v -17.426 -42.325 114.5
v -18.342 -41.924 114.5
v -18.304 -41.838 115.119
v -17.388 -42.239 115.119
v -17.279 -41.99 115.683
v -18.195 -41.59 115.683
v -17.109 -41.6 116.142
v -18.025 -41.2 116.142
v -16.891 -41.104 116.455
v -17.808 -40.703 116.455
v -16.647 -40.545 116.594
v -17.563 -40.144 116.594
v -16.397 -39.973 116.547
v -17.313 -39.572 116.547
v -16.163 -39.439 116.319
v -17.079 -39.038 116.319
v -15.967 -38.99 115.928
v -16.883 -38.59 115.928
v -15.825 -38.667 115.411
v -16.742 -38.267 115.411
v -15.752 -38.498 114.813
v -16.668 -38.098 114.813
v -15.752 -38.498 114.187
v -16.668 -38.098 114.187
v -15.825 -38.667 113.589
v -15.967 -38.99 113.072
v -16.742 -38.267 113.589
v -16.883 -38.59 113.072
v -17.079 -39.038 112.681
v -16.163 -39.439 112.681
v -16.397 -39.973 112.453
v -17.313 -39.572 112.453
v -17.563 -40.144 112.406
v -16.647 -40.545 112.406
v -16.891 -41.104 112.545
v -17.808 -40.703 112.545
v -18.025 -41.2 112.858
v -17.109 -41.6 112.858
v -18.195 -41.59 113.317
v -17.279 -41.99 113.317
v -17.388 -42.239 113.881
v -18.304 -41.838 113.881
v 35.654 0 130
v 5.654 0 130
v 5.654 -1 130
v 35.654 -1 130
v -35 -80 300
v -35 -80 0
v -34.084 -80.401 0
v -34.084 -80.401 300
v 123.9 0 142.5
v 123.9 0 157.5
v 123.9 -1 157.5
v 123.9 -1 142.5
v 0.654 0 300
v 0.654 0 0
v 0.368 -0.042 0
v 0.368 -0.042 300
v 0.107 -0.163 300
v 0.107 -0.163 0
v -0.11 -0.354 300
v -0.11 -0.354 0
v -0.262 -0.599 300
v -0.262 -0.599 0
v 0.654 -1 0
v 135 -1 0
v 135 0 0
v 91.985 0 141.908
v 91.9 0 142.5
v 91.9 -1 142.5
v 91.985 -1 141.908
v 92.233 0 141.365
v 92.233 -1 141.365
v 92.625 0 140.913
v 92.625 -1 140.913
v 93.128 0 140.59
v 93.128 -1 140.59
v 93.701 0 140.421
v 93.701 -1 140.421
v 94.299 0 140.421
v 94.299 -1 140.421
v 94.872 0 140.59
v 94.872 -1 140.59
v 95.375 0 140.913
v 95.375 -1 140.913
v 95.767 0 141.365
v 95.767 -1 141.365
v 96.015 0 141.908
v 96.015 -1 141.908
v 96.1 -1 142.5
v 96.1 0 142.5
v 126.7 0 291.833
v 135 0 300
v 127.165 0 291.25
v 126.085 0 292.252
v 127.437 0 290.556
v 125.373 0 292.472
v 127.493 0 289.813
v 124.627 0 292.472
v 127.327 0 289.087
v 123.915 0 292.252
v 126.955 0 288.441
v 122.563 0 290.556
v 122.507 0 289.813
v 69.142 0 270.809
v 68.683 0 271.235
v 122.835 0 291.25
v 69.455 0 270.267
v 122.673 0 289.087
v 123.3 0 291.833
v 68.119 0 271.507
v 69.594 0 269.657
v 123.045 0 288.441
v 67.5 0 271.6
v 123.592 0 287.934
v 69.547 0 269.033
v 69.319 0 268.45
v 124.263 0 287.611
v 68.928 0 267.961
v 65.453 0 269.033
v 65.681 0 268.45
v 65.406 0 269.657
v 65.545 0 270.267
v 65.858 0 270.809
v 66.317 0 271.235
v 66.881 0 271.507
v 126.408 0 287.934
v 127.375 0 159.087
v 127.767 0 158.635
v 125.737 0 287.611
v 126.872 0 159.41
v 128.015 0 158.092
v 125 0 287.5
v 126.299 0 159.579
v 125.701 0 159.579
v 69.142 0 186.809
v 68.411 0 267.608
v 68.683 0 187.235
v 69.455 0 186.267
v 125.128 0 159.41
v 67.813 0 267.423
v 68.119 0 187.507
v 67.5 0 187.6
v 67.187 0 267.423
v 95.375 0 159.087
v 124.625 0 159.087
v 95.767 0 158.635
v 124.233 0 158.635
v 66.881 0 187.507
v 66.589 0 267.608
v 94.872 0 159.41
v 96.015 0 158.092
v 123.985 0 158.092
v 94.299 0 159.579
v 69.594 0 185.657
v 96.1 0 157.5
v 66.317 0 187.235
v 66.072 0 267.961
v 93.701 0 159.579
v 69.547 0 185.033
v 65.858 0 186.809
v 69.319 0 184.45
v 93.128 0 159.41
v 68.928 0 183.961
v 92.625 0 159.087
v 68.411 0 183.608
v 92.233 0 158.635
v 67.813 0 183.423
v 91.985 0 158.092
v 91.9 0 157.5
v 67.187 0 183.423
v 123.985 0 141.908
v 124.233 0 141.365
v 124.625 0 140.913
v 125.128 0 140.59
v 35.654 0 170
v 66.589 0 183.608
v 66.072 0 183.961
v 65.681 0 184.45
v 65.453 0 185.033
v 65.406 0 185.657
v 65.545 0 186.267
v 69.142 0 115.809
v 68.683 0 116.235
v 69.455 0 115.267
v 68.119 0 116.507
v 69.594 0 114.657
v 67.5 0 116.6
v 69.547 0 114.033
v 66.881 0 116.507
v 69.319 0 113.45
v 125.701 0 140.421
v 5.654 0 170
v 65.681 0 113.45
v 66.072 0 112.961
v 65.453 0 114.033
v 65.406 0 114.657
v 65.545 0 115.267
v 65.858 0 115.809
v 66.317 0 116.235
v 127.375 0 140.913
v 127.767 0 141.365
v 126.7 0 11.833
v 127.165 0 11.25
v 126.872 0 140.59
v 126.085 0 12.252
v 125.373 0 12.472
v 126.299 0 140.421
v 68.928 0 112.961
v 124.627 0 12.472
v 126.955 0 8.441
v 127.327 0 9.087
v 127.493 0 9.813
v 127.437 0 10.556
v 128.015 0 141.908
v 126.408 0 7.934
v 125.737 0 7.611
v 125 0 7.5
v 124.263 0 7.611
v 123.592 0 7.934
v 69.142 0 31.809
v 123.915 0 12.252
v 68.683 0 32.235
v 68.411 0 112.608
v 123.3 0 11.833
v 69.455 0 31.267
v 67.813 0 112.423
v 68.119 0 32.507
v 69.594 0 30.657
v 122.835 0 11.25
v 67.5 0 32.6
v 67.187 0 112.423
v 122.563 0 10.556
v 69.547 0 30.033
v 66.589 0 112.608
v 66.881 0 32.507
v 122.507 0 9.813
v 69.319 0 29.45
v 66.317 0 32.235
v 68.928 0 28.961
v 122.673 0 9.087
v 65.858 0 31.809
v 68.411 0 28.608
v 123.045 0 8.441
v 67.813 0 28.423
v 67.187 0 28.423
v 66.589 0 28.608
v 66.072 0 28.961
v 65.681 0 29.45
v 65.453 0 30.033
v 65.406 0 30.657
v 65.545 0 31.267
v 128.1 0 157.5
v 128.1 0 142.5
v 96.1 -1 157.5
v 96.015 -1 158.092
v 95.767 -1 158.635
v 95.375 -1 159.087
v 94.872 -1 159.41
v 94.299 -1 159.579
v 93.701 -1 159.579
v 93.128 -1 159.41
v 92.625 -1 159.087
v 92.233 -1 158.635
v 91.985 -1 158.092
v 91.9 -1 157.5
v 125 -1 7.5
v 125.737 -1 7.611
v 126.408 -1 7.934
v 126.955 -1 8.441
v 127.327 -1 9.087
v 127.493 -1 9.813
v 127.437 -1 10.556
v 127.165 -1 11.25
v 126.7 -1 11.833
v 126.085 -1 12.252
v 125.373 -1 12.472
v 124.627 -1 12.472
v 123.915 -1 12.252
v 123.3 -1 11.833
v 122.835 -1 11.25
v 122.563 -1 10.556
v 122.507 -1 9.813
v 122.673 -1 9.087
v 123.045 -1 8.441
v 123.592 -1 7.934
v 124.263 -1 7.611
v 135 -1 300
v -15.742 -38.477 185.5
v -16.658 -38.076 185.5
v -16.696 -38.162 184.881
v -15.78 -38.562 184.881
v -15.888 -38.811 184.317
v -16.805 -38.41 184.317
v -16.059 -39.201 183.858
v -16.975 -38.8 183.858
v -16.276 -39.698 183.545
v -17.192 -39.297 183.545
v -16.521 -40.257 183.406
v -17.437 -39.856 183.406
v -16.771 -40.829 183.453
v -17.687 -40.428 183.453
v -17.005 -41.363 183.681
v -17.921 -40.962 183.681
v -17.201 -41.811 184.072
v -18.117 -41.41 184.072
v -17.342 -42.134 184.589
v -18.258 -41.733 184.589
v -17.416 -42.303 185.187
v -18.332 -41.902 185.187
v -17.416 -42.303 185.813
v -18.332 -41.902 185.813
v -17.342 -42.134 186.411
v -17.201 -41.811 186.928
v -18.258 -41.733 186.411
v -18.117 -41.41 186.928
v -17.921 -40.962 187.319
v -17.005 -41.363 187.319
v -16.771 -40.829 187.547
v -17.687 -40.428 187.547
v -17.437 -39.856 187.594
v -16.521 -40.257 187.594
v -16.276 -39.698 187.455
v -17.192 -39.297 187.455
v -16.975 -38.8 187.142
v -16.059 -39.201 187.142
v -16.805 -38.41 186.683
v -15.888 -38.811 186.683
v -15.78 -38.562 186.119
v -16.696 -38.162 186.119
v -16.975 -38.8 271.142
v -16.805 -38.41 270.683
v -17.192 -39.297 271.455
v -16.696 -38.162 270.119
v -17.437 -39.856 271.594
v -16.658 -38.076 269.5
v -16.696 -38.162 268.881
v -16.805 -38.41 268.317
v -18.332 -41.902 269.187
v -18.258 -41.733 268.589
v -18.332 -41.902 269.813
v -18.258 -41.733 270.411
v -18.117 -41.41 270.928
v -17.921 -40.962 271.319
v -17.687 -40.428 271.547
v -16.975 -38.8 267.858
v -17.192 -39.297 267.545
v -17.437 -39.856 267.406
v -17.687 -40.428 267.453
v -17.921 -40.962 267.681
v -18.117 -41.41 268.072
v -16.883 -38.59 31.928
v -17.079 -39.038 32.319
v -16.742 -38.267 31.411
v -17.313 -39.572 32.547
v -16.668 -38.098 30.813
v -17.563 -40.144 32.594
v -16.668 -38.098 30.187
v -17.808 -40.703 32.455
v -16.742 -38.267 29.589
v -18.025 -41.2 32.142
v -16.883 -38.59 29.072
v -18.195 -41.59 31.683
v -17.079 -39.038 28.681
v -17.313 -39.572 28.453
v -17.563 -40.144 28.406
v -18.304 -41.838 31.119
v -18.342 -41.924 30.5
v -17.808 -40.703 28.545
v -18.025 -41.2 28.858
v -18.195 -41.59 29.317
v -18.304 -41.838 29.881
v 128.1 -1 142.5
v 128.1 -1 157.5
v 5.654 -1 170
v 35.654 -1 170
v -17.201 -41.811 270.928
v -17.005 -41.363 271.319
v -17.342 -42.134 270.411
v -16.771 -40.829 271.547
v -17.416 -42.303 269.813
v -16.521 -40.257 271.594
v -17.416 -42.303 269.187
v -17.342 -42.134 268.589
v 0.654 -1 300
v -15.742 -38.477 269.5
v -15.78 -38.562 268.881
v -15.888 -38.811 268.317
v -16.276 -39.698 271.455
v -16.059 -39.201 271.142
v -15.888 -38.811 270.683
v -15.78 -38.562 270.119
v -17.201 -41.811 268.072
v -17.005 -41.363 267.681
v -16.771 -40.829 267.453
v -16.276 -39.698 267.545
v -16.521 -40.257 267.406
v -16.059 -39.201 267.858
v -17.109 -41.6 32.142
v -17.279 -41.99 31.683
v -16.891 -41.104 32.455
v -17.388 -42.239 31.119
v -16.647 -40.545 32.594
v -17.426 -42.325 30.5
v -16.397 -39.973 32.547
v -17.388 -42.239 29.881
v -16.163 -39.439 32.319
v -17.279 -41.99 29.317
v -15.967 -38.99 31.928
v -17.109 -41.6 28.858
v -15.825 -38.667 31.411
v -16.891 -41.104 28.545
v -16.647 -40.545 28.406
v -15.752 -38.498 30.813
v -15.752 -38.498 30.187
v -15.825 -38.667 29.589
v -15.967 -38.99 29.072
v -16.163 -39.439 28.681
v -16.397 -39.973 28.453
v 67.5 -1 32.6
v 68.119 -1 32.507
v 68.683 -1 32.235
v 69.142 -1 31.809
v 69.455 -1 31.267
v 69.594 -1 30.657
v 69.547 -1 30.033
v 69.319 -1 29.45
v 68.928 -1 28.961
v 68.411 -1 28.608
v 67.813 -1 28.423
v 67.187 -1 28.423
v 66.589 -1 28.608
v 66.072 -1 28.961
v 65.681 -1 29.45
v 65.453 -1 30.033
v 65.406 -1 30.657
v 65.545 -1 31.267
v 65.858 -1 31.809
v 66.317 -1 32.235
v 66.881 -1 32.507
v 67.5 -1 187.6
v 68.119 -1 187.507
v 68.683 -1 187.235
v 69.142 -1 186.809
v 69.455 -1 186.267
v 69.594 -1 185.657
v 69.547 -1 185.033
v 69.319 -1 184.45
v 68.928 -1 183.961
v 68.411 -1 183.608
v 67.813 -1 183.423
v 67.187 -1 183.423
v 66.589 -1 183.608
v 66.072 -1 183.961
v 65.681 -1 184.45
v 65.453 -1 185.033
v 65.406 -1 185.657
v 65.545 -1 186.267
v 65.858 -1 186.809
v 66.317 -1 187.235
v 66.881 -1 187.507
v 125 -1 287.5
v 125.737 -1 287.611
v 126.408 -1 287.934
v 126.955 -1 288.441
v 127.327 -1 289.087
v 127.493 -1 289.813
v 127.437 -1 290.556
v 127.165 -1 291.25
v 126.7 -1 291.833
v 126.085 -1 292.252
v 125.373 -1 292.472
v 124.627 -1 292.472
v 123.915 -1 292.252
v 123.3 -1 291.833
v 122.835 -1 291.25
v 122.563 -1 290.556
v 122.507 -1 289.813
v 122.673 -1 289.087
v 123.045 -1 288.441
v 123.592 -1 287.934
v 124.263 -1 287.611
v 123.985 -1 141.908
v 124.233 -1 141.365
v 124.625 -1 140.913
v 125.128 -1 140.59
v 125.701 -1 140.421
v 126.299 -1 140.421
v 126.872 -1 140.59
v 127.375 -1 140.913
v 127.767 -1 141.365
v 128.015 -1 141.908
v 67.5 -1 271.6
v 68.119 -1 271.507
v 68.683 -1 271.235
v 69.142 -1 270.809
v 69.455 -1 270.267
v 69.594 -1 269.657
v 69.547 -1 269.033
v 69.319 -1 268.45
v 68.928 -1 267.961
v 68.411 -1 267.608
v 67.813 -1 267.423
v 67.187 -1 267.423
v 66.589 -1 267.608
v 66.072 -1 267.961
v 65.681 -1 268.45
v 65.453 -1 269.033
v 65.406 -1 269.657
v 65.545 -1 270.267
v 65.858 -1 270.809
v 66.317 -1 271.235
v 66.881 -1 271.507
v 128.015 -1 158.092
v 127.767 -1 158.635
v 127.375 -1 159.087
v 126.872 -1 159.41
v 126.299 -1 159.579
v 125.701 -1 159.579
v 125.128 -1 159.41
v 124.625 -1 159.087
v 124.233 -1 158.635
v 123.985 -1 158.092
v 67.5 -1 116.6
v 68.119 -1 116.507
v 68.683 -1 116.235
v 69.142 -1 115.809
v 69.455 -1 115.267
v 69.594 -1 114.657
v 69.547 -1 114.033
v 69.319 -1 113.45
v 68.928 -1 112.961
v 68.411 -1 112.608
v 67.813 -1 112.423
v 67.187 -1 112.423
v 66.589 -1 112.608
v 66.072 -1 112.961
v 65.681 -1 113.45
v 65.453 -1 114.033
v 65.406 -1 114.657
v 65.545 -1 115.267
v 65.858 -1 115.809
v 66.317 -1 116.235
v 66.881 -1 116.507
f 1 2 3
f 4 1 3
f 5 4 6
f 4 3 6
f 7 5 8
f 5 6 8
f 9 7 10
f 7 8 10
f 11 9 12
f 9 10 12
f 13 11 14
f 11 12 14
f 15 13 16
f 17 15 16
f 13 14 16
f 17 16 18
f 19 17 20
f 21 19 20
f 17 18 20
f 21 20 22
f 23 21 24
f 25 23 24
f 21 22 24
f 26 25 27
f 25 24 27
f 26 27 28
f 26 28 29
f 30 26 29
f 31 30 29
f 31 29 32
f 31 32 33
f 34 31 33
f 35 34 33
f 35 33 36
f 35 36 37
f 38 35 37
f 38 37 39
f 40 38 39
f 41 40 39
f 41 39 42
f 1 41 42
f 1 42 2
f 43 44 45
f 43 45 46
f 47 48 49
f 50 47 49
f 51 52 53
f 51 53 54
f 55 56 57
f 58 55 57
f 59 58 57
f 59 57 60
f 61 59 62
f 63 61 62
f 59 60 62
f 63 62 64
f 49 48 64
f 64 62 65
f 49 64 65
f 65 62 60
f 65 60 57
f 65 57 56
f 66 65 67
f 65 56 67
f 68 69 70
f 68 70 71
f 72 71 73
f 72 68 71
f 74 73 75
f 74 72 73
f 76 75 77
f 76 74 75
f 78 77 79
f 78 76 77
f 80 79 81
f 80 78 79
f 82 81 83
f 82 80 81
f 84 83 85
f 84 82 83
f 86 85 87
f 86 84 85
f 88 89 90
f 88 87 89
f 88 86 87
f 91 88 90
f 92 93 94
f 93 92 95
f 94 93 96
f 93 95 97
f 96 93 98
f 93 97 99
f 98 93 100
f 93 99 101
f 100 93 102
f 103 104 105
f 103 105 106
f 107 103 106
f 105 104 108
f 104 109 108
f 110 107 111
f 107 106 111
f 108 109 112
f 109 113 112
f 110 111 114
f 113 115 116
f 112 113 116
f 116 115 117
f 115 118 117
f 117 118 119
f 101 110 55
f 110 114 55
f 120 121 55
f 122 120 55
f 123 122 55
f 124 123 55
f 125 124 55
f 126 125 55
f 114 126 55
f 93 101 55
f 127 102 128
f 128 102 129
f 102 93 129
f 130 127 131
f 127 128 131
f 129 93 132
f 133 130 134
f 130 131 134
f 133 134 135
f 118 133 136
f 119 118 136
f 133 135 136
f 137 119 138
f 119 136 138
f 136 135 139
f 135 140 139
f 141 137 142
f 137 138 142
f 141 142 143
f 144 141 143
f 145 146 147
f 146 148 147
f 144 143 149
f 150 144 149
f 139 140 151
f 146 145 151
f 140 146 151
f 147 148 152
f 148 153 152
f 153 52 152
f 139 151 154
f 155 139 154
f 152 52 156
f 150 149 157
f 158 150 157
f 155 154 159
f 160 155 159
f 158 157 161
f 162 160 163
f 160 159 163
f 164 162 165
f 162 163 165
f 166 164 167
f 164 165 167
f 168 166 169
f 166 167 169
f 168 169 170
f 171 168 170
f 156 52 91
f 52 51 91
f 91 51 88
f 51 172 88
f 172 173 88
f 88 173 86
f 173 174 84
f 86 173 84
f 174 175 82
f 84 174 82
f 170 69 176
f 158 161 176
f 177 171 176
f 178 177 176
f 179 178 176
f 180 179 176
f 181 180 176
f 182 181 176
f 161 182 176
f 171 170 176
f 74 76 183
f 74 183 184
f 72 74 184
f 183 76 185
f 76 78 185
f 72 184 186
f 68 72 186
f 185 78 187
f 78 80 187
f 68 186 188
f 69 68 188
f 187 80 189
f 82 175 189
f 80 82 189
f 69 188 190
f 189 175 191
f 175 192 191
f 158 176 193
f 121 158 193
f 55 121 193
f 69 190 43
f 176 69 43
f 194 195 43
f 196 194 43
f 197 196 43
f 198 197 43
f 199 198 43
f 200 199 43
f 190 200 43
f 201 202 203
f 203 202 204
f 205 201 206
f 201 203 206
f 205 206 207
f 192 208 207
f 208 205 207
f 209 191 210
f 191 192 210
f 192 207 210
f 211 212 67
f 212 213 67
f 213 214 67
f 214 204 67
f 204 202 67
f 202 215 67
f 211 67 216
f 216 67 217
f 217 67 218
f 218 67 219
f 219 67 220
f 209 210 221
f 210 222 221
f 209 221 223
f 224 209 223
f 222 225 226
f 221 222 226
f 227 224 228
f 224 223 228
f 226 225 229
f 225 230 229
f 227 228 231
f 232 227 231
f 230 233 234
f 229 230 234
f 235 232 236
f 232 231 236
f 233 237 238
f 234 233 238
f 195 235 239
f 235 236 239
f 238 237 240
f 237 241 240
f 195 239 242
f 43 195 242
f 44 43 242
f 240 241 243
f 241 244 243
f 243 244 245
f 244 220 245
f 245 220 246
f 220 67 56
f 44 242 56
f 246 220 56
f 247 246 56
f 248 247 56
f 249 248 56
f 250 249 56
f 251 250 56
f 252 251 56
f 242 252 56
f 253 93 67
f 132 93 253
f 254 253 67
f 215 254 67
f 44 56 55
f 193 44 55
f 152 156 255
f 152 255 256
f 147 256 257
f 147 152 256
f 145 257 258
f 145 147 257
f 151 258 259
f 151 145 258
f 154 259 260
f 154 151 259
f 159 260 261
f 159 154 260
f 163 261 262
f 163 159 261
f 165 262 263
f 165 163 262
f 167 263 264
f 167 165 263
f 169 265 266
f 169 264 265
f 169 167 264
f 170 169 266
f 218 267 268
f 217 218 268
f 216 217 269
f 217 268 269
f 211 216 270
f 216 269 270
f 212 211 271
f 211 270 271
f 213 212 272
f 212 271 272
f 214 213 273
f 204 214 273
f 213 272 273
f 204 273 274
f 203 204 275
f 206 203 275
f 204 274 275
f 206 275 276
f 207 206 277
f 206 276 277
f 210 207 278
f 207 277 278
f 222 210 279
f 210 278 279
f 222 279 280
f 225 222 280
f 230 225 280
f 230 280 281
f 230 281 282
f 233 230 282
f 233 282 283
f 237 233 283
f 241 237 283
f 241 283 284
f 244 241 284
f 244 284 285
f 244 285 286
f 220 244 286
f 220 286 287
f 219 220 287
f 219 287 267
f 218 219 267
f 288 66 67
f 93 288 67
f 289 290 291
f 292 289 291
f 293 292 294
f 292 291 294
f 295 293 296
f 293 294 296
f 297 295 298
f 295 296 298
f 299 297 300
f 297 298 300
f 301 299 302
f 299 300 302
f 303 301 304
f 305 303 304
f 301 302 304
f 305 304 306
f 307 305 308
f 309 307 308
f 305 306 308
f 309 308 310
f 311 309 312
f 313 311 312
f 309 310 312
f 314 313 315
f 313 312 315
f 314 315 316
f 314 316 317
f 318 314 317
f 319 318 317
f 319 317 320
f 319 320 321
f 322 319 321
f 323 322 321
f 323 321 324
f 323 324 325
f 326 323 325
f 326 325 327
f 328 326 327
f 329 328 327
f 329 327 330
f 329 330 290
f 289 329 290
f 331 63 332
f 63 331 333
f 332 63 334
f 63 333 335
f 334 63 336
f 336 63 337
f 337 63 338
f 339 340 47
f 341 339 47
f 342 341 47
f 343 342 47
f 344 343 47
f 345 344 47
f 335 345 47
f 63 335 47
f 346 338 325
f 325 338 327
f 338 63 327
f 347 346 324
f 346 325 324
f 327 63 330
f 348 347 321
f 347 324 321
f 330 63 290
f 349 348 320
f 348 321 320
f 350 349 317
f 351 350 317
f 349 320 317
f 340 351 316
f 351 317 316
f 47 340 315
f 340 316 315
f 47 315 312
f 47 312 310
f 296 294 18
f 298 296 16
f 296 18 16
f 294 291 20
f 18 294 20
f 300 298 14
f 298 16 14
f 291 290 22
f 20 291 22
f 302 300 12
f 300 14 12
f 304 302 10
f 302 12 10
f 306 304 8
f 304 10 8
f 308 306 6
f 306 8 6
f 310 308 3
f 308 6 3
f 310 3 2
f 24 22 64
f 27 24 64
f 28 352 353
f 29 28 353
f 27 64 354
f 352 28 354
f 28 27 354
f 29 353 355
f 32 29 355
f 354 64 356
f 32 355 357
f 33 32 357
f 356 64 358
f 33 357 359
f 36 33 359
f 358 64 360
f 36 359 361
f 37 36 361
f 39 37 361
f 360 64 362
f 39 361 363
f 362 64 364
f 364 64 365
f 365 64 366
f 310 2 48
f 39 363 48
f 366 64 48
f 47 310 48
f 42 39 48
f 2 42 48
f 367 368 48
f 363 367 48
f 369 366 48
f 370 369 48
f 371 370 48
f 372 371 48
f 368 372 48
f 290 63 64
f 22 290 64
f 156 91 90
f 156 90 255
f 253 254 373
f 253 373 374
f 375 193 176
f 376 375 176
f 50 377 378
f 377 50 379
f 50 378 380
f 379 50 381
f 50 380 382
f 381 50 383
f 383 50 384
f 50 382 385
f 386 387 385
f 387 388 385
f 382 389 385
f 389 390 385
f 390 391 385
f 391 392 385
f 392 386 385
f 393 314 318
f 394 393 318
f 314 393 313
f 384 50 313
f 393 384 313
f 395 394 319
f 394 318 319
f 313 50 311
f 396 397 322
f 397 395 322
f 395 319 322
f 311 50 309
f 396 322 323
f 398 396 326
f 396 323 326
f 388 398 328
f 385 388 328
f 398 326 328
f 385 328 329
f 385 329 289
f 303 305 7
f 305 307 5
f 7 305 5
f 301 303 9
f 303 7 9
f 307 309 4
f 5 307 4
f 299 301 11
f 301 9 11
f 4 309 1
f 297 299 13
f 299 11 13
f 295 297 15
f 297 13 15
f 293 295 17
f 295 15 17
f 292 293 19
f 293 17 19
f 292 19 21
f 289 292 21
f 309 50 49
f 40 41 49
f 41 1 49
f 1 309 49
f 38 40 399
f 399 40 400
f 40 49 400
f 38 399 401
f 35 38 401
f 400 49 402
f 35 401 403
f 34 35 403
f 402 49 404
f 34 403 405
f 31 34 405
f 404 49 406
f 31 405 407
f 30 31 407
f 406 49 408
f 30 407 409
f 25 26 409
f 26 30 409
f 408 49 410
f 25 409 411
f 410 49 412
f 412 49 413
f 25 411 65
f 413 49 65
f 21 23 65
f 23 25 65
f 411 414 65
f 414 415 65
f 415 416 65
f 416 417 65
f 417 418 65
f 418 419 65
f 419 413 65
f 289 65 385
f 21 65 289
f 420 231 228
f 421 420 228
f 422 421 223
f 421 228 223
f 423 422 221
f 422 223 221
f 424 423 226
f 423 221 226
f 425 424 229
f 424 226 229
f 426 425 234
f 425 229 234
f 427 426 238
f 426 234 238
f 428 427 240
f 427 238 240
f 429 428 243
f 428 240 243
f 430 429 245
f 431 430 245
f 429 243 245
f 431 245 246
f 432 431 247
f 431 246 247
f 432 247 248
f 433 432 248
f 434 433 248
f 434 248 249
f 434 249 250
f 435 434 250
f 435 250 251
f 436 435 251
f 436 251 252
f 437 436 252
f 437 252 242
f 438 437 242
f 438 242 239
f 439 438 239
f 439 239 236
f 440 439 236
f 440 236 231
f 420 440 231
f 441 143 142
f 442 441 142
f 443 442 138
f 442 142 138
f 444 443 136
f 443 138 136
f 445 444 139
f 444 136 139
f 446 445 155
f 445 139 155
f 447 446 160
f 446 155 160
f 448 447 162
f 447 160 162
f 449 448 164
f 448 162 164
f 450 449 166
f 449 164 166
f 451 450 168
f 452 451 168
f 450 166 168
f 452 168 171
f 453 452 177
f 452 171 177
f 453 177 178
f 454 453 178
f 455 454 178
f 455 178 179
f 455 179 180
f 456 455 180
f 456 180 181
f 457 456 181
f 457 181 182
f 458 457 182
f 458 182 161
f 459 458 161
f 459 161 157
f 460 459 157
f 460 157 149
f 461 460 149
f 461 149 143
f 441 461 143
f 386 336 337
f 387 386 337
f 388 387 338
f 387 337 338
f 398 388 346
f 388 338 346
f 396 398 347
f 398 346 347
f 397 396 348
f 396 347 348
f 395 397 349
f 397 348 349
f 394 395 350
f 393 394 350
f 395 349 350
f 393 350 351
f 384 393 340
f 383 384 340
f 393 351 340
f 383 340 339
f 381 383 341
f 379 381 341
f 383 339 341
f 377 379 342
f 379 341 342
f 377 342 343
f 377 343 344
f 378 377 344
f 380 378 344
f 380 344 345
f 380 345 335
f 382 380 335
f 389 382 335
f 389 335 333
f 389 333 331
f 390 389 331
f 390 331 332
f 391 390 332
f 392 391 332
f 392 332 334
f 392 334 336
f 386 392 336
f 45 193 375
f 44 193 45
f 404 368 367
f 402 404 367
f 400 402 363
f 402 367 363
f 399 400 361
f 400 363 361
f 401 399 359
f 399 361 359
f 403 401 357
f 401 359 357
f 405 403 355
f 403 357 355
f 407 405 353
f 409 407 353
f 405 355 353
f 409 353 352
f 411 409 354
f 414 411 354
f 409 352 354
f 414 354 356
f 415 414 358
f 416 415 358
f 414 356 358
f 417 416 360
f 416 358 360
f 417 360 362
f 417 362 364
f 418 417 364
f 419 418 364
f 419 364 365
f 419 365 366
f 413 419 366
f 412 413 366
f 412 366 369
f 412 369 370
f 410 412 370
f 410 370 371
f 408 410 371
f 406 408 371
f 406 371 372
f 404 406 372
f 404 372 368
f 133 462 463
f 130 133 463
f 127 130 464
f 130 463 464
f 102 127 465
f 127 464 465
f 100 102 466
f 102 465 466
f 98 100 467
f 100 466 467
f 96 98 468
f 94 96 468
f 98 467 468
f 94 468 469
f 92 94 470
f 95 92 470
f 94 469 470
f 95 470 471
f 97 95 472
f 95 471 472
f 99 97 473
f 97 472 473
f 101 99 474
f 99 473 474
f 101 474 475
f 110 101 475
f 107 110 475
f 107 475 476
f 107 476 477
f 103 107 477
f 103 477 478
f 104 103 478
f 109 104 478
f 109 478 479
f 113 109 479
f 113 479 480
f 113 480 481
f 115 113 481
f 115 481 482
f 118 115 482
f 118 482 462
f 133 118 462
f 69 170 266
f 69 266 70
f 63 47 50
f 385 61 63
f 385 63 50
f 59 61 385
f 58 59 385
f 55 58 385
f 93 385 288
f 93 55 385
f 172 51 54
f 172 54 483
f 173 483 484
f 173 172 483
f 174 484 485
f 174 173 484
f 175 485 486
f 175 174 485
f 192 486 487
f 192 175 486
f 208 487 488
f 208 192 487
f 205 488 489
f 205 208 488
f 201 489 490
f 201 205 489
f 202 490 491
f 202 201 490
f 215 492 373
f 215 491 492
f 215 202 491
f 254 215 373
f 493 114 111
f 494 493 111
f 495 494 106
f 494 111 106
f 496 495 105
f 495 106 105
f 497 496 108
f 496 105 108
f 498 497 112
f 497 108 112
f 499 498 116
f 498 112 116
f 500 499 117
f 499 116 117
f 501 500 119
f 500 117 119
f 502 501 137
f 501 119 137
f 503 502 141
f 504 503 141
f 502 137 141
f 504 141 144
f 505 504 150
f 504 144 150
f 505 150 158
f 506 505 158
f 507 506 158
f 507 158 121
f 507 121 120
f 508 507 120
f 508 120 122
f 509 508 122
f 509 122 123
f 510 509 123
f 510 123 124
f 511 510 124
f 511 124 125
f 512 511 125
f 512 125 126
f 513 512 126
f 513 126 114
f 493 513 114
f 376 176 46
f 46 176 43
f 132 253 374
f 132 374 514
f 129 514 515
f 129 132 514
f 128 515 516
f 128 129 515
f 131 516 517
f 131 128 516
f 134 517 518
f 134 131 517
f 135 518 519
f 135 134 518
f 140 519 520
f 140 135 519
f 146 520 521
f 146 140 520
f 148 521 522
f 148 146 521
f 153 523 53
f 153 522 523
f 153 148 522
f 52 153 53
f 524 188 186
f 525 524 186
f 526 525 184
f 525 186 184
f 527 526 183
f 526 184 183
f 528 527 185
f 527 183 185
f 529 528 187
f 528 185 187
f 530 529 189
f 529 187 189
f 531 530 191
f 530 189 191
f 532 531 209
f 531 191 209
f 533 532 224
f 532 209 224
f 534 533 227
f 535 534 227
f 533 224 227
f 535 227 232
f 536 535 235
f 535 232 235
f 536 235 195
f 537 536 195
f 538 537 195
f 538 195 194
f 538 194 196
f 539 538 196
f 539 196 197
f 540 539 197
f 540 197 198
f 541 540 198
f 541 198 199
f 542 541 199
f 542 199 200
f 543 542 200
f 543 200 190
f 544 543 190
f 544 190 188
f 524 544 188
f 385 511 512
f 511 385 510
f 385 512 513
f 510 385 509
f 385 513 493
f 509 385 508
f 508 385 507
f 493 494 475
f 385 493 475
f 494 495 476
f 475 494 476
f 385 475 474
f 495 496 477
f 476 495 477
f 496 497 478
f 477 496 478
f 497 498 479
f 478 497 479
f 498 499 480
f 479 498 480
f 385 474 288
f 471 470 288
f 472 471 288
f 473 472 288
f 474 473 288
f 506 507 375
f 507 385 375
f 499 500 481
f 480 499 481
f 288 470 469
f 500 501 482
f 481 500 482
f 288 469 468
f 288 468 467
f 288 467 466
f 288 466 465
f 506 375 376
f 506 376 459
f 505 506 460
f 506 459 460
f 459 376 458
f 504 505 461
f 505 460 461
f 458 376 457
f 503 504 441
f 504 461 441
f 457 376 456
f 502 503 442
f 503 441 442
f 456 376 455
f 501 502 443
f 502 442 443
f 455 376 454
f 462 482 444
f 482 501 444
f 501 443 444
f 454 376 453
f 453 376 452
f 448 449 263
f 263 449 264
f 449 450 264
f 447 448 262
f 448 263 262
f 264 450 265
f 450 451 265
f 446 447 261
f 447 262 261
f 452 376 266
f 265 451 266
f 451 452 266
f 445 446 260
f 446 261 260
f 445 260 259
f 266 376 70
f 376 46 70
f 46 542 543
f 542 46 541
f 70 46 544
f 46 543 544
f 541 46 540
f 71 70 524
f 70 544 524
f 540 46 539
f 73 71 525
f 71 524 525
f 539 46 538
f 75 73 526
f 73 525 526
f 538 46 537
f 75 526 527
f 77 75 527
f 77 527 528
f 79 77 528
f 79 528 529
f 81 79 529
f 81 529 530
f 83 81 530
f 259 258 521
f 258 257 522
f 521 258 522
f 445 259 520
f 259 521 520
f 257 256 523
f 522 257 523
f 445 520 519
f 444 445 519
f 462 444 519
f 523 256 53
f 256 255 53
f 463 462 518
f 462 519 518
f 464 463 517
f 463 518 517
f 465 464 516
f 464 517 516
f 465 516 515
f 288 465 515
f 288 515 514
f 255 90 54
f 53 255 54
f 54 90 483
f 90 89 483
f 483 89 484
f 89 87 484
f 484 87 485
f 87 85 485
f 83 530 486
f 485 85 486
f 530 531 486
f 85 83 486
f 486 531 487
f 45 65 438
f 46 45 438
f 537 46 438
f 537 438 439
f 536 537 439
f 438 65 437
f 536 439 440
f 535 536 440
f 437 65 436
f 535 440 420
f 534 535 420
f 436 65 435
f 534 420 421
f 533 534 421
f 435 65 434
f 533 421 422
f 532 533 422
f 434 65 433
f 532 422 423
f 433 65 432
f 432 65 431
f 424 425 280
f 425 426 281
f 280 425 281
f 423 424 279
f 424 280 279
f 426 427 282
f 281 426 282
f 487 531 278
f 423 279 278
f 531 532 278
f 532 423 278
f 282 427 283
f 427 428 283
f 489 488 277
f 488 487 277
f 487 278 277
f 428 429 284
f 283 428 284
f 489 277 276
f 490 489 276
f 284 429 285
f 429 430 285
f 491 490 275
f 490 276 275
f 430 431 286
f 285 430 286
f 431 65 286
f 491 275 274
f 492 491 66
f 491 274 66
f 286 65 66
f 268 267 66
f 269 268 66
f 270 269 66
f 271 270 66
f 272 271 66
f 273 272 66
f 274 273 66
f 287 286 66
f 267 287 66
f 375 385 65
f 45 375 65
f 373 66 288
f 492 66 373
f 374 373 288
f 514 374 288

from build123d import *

# Parameters (mm, degrees)
T_LE_DE_BASE_PLI_E1_DEPTH = 300
ESQUISSE7_R               = 2.5
ENL_V_MAT_EXTRU_1_DEPTH   = 339.42205902
ENL_V_MAT_EXTRU_3_DEPTH   = 339.658074862
ESQUISSE14_W              = 30
ESQUISSE14_H              = 40
ENL_V_MAT_EXTRU_4_DEPTH   = 339.658074862
ESQUISSE15_R              = 2.1
ENL_V_MAT_EXTRU_5_DEPTH   = 339.658074862
ESQUISSE16_R              = 2.1
ENL_V_MAT_EXTRU_6_DEPTH   = 339.658074862


# Read off the part's stored shape, not the designer's step: Tôle de base pliée1
with BuildPart() as part:
    # Tôle de base pliée1 outline → Tôle de base pliée1 (new body)
    with BuildSketch(Plane.XY):
        with BuildLine():
            Line((-0.26214176, -0.599181166), (-35, -80))
            Line((-35, -80), (-34.083842665, -80.400818834))
            Line((-34.083842665, -80.400818834), (0.654015575, -1))
            Line((0.654015575, -1), (135, -1))
            Line((135, -1), (135, 0))
            Line((135, 0), (0.654015575, 0))
            ThreePointArc((0.654015575, 0), (0.10666689, -0.163095336), (-0.26214176, -0.599181166))
        make_face()
    extrude(amount=T_LE_DE_BASE_PLI_E1_DEPTH)

    # Esquisse7 → Enlèv. mat.-Extru.1 (cut, through all)
    with BuildSketch(Plane(origin=(0, -1, 0), x_dir=(-1, 0, 0), z_dir=(0, -1, 0))):
        with Locations(Location((-125, -290, 0), (0, 0, 90))):
            Circle(ESQUISSE7_R)
        with Locations(Location((-125, -10, 0), (0, 0, 90))):
            Circle(ESQUISSE7_R)
    extrude(amount=-ENL_V_MAT_EXTRU_1_DEPTH, mode=Mode.SUBTRACT)

    # Esquisse10 → Enlèv. mat.-Extru.3 (cut, through all)
    with BuildSketch(Plane(origin=(0, 0, 0), x_dir=(1, 0, 0), z_dir=(0, 1, 0))):
        with BuildLine():
            Line((96.1, -142.5), (96.1, -157.5))
            ThreePointArc((96.1, -157.5), (94, -159.6), (91.9, -157.5))
            Line((91.9, -157.5), (91.9, -142.5))
            ThreePointArc((91.9, -142.5), (94, -140.4), (96.1, -142.5))
        make_face()
        with BuildLine():
            Line((128.1, -142.5), (128.1, -157.5))
            ThreePointArc((128.1, -157.5), (126, -159.6), (123.9, -157.5))
            Line((123.9, -157.5), (123.9, -142.5))
            ThreePointArc((123.9, -142.5), (126, -140.4), (128.1, -142.5))
        make_face()
    extrude(amount=-ENL_V_MAT_EXTRU_3_DEPTH, mode=Mode.SUBTRACT)

    # Esquisse14 → Enlèv. mat.-Extru.4 (cut, through all)
    with BuildSketch(Plane(origin=(0, 0, 0), x_dir=(1, 0, 0), z_dir=(0, 1, 0))):
        with Locations((20.654015575, -150)):
            Rectangle(ESQUISSE14_W, ESQUISSE14_H)
    extrude(amount=-ENL_V_MAT_EXTRU_4_DEPTH, mode=Mode.SUBTRACT)

    # Esquisse15 → Enlèv. mat.-Extru.5 (cut, through all)
    with BuildSketch(Plane(origin=(0, 0, 0), x_dir=(1, 0, 0), z_dir=(0, 1, 0))):
        with Locations(Location((67.5, -114.5, 0), (0, 0, 270))):
            Circle(ESQUISSE15_R)
        with Locations(Location((67.5, -30.5, 0), (0, 0, 270))):
            Circle(ESQUISSE15_R)
        with Locations(Location((67.5, -269.5, 0), (0, 0, 270))):
            Circle(ESQUISSE15_R)
        with Locations(Location((67.5, -185.5, 0), (0, 0, 270))):
            Circle(ESQUISSE15_R)
    extrude(amount=-ENL_V_MAT_EXTRU_5_DEPTH, mode=Mode.SUBTRACT)

    # Esquisse16 → Enlèv. mat.-Extru.6 (cut, through all)
    with BuildSketch(Plane(origin=(0, 0, 0), x_dir=(0, 0, 1), z_dir=(-0.9161573349021892, 0.40081883401970764, 0))):
        with Locations(Location((114.5, -43.660622991, 0), (0, 0, 270))):
            Circle(ESQUISSE16_R)
        with Locations(Location((30.5, -43.660622991, 0), (0, 0, 270))):
            Circle(ESQUISSE16_R)
        with Locations(Location((269.5, -43.660622991, 0), (0, 0, 90))):
            Circle(ESQUISSE16_R)
        with Locations(Location((185.5, -43.660622991, 0), (0, 0, 90))):
            Circle(ESQUISSE16_R)
    extrude(amount=-ENL_V_MAT_EXTRU_6_DEPTH, mode=Mode.SUBTRACT)


solid = part.part
